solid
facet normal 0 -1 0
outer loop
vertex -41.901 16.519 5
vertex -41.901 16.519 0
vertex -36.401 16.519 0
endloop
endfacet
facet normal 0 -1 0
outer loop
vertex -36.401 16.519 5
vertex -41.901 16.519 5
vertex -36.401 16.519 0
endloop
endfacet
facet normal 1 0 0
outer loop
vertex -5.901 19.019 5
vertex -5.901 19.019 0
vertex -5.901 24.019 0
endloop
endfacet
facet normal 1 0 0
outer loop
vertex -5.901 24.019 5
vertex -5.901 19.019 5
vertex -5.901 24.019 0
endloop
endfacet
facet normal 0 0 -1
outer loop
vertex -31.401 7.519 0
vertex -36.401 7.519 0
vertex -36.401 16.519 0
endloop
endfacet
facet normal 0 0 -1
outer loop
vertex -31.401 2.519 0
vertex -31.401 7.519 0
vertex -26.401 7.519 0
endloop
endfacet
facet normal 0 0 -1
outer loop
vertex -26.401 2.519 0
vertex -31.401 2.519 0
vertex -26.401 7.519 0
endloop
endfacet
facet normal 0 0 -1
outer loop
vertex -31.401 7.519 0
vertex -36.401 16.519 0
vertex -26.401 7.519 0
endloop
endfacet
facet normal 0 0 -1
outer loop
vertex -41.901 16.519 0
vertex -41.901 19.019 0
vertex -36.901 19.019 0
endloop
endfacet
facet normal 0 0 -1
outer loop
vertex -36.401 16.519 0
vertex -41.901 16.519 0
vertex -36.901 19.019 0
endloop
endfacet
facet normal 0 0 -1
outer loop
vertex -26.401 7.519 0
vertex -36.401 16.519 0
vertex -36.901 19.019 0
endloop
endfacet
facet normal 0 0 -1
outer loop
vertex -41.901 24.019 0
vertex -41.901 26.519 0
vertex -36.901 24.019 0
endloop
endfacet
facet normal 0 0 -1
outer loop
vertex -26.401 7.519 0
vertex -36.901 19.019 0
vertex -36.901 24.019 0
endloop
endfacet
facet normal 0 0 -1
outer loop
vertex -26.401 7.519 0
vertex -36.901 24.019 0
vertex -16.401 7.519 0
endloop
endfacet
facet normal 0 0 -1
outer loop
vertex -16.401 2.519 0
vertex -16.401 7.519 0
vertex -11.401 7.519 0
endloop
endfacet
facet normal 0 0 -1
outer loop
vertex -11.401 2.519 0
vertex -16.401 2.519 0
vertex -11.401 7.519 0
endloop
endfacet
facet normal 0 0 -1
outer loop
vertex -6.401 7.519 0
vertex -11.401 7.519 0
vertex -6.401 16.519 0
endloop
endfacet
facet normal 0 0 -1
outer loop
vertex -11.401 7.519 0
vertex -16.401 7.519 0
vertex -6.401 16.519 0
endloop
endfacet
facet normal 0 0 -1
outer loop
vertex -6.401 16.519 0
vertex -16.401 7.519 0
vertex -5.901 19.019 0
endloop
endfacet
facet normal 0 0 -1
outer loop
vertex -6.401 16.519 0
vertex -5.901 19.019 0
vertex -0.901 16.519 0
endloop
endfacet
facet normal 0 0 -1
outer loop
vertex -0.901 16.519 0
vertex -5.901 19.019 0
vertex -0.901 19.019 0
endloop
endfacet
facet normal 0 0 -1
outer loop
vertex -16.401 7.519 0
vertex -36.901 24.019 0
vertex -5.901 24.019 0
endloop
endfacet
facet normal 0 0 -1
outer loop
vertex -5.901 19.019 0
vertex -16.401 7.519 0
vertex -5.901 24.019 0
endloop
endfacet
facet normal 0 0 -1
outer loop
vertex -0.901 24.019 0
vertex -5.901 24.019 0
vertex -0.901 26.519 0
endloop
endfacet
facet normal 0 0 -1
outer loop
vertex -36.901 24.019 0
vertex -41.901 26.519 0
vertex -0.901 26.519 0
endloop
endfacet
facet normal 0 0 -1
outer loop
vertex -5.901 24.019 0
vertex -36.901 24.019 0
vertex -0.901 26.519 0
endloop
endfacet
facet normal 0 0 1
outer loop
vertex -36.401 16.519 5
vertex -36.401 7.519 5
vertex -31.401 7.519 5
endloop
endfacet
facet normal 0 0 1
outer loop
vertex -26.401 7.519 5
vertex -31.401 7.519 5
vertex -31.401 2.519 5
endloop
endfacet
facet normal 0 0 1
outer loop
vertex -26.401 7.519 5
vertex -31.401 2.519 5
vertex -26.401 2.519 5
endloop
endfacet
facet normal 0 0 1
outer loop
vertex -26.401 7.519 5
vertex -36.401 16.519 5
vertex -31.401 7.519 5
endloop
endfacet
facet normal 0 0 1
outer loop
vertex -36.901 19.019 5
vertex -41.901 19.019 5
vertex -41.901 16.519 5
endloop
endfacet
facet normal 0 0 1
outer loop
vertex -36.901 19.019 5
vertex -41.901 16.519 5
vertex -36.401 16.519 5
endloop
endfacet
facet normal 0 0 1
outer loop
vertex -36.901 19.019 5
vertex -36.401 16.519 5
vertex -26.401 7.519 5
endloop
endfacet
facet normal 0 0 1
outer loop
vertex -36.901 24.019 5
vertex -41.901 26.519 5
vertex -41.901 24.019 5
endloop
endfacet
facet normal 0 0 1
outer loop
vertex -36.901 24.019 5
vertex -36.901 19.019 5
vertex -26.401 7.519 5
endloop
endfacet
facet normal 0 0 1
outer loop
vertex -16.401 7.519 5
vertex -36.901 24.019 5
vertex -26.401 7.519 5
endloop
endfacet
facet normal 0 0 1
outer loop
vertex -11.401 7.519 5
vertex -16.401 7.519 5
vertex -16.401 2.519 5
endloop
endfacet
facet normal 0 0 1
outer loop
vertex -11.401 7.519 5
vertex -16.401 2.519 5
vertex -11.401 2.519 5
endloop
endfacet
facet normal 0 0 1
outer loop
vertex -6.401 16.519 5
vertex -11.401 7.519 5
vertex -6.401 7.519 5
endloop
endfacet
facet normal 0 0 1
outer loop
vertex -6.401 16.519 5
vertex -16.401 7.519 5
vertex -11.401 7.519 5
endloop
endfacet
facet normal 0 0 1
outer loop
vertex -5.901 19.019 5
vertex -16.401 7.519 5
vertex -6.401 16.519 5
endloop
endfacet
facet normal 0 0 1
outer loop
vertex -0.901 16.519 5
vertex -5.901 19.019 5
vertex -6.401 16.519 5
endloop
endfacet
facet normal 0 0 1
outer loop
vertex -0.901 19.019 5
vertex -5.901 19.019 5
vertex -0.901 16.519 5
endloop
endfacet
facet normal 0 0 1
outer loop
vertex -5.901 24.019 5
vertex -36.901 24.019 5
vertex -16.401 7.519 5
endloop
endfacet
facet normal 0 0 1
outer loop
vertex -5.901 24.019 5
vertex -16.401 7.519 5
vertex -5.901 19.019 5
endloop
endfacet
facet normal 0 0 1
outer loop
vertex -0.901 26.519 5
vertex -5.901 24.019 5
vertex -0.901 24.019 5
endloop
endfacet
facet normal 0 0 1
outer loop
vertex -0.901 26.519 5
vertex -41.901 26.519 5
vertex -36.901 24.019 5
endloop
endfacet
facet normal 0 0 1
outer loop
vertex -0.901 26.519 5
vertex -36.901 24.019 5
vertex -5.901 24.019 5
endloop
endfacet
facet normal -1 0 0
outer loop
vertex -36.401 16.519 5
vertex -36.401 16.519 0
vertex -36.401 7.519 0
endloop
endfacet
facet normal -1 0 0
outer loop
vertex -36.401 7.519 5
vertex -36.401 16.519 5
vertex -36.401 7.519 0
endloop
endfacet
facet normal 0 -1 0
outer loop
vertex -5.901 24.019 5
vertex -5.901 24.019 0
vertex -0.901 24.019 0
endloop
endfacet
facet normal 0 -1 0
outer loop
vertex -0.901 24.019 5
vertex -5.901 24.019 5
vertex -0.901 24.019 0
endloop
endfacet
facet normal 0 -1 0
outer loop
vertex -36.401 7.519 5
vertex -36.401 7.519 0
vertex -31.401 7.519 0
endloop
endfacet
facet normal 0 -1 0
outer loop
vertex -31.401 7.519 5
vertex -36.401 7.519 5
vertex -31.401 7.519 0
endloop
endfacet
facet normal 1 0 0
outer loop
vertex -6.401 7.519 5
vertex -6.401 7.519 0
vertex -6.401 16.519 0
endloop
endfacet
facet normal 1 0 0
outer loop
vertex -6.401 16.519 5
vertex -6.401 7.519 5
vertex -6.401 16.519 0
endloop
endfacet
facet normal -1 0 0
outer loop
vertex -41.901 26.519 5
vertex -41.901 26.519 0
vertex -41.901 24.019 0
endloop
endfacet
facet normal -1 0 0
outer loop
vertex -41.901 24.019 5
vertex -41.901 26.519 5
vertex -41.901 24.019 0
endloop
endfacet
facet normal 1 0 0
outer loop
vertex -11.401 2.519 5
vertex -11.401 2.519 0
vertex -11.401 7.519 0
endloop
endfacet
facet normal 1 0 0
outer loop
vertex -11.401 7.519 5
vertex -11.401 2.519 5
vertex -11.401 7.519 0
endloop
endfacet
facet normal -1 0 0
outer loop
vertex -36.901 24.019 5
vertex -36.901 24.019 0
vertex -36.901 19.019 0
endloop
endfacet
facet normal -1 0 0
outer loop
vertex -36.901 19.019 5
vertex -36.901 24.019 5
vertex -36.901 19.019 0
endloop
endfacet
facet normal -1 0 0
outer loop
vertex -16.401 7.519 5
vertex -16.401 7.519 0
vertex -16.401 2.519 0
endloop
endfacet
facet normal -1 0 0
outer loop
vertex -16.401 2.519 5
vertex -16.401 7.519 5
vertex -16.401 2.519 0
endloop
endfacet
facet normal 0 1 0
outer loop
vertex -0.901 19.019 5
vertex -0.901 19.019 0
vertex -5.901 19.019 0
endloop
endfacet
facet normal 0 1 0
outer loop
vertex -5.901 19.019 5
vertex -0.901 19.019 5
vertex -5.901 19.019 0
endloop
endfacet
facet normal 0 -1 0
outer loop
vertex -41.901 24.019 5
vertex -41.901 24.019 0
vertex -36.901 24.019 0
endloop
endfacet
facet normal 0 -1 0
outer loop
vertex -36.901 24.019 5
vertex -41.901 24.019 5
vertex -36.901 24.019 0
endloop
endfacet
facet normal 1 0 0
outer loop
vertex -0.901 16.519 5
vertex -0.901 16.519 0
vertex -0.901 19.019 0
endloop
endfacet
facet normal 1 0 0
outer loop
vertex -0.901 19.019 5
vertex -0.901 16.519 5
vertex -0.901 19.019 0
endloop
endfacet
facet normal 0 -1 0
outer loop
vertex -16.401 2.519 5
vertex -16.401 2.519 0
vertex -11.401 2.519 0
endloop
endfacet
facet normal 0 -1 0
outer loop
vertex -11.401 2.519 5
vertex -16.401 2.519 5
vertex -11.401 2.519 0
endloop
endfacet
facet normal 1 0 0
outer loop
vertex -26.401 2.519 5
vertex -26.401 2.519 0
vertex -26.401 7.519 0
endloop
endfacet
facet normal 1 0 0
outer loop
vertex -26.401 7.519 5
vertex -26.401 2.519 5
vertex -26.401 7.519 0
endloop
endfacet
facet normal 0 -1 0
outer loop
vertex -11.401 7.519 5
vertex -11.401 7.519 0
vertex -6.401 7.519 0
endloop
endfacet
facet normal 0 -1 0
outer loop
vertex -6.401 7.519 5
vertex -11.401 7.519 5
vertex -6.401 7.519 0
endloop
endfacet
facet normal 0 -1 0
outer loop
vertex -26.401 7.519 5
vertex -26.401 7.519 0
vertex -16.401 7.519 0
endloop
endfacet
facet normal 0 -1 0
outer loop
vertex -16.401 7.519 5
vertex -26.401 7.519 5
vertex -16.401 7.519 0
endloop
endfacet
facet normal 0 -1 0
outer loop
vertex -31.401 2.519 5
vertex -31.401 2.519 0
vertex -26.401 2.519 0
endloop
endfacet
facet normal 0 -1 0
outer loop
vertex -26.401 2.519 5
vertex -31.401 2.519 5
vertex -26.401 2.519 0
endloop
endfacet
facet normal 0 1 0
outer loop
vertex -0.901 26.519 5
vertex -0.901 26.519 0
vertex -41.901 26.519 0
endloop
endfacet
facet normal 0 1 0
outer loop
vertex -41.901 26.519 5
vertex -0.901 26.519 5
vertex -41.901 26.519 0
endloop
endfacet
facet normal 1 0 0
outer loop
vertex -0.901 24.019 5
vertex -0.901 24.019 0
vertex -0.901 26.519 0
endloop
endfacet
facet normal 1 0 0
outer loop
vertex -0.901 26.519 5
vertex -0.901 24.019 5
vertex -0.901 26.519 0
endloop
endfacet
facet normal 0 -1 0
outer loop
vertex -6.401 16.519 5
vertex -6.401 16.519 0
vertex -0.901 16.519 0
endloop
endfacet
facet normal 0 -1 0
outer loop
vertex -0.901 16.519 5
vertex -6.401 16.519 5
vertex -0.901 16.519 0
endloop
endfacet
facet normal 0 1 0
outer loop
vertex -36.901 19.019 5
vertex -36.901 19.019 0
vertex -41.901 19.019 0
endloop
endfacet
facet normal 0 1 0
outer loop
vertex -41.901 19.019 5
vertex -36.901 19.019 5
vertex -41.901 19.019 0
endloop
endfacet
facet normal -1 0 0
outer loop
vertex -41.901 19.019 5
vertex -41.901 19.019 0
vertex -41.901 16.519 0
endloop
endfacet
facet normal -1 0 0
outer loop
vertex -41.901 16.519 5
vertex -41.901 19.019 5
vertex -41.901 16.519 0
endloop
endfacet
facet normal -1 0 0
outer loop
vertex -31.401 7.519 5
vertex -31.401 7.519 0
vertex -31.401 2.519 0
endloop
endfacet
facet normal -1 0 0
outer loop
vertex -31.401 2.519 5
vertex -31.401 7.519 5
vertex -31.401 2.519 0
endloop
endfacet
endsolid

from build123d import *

# Parameters (mm, degrees)
BOSS_EXTRU_1_DEPTH = 5


with BuildPart() as part:
    # Esquisse1 → Boss.-Extru.1 (new body)
    with BuildSketch(Plane.XY):
        Polygon((-21.401470553, 26.519094535), (-21.401470553, 7.519094535), (-16.401470553, 7.519094535), (-16.401470553, 2.519094535), (-11.401470553, 2.519094535), (-11.401470553, 7.519094535), (-6.401470553, 7.519094535), (-6.401470553, 16.519094535), (-0.901470553, 16.519094535), (-0.901470553, 19.019094535), (-5.901470553, 19.019094535), (-5.901470553, 24.019094535), (-0.901470553, 24.019094535), (-0.901470553, 26.519094535), align=None)
        Polygon((-41.901470553, 16.519094535), (-36.401470553, 16.519094535), (-36.401470553, 7.519094535), (-31.401470553, 7.519094535), (-31.401470553, 2.519094535), (-26.401470553, 2.519094535), (-26.401470553, 7.519094535), (-21.401470553, 7.519094535), (-21.401470553, 26.519094535), (-41.901470553, 26.519094535), (-41.901470553, 24.019094535), (-36.901470553, 24.019094535), (-36.901470553, 19.019094535), (-41.901470553, 19.019094535), align=None)
    extrude(amount=BOSS_EXTRU_1_DEPTH)


solid = part.part
